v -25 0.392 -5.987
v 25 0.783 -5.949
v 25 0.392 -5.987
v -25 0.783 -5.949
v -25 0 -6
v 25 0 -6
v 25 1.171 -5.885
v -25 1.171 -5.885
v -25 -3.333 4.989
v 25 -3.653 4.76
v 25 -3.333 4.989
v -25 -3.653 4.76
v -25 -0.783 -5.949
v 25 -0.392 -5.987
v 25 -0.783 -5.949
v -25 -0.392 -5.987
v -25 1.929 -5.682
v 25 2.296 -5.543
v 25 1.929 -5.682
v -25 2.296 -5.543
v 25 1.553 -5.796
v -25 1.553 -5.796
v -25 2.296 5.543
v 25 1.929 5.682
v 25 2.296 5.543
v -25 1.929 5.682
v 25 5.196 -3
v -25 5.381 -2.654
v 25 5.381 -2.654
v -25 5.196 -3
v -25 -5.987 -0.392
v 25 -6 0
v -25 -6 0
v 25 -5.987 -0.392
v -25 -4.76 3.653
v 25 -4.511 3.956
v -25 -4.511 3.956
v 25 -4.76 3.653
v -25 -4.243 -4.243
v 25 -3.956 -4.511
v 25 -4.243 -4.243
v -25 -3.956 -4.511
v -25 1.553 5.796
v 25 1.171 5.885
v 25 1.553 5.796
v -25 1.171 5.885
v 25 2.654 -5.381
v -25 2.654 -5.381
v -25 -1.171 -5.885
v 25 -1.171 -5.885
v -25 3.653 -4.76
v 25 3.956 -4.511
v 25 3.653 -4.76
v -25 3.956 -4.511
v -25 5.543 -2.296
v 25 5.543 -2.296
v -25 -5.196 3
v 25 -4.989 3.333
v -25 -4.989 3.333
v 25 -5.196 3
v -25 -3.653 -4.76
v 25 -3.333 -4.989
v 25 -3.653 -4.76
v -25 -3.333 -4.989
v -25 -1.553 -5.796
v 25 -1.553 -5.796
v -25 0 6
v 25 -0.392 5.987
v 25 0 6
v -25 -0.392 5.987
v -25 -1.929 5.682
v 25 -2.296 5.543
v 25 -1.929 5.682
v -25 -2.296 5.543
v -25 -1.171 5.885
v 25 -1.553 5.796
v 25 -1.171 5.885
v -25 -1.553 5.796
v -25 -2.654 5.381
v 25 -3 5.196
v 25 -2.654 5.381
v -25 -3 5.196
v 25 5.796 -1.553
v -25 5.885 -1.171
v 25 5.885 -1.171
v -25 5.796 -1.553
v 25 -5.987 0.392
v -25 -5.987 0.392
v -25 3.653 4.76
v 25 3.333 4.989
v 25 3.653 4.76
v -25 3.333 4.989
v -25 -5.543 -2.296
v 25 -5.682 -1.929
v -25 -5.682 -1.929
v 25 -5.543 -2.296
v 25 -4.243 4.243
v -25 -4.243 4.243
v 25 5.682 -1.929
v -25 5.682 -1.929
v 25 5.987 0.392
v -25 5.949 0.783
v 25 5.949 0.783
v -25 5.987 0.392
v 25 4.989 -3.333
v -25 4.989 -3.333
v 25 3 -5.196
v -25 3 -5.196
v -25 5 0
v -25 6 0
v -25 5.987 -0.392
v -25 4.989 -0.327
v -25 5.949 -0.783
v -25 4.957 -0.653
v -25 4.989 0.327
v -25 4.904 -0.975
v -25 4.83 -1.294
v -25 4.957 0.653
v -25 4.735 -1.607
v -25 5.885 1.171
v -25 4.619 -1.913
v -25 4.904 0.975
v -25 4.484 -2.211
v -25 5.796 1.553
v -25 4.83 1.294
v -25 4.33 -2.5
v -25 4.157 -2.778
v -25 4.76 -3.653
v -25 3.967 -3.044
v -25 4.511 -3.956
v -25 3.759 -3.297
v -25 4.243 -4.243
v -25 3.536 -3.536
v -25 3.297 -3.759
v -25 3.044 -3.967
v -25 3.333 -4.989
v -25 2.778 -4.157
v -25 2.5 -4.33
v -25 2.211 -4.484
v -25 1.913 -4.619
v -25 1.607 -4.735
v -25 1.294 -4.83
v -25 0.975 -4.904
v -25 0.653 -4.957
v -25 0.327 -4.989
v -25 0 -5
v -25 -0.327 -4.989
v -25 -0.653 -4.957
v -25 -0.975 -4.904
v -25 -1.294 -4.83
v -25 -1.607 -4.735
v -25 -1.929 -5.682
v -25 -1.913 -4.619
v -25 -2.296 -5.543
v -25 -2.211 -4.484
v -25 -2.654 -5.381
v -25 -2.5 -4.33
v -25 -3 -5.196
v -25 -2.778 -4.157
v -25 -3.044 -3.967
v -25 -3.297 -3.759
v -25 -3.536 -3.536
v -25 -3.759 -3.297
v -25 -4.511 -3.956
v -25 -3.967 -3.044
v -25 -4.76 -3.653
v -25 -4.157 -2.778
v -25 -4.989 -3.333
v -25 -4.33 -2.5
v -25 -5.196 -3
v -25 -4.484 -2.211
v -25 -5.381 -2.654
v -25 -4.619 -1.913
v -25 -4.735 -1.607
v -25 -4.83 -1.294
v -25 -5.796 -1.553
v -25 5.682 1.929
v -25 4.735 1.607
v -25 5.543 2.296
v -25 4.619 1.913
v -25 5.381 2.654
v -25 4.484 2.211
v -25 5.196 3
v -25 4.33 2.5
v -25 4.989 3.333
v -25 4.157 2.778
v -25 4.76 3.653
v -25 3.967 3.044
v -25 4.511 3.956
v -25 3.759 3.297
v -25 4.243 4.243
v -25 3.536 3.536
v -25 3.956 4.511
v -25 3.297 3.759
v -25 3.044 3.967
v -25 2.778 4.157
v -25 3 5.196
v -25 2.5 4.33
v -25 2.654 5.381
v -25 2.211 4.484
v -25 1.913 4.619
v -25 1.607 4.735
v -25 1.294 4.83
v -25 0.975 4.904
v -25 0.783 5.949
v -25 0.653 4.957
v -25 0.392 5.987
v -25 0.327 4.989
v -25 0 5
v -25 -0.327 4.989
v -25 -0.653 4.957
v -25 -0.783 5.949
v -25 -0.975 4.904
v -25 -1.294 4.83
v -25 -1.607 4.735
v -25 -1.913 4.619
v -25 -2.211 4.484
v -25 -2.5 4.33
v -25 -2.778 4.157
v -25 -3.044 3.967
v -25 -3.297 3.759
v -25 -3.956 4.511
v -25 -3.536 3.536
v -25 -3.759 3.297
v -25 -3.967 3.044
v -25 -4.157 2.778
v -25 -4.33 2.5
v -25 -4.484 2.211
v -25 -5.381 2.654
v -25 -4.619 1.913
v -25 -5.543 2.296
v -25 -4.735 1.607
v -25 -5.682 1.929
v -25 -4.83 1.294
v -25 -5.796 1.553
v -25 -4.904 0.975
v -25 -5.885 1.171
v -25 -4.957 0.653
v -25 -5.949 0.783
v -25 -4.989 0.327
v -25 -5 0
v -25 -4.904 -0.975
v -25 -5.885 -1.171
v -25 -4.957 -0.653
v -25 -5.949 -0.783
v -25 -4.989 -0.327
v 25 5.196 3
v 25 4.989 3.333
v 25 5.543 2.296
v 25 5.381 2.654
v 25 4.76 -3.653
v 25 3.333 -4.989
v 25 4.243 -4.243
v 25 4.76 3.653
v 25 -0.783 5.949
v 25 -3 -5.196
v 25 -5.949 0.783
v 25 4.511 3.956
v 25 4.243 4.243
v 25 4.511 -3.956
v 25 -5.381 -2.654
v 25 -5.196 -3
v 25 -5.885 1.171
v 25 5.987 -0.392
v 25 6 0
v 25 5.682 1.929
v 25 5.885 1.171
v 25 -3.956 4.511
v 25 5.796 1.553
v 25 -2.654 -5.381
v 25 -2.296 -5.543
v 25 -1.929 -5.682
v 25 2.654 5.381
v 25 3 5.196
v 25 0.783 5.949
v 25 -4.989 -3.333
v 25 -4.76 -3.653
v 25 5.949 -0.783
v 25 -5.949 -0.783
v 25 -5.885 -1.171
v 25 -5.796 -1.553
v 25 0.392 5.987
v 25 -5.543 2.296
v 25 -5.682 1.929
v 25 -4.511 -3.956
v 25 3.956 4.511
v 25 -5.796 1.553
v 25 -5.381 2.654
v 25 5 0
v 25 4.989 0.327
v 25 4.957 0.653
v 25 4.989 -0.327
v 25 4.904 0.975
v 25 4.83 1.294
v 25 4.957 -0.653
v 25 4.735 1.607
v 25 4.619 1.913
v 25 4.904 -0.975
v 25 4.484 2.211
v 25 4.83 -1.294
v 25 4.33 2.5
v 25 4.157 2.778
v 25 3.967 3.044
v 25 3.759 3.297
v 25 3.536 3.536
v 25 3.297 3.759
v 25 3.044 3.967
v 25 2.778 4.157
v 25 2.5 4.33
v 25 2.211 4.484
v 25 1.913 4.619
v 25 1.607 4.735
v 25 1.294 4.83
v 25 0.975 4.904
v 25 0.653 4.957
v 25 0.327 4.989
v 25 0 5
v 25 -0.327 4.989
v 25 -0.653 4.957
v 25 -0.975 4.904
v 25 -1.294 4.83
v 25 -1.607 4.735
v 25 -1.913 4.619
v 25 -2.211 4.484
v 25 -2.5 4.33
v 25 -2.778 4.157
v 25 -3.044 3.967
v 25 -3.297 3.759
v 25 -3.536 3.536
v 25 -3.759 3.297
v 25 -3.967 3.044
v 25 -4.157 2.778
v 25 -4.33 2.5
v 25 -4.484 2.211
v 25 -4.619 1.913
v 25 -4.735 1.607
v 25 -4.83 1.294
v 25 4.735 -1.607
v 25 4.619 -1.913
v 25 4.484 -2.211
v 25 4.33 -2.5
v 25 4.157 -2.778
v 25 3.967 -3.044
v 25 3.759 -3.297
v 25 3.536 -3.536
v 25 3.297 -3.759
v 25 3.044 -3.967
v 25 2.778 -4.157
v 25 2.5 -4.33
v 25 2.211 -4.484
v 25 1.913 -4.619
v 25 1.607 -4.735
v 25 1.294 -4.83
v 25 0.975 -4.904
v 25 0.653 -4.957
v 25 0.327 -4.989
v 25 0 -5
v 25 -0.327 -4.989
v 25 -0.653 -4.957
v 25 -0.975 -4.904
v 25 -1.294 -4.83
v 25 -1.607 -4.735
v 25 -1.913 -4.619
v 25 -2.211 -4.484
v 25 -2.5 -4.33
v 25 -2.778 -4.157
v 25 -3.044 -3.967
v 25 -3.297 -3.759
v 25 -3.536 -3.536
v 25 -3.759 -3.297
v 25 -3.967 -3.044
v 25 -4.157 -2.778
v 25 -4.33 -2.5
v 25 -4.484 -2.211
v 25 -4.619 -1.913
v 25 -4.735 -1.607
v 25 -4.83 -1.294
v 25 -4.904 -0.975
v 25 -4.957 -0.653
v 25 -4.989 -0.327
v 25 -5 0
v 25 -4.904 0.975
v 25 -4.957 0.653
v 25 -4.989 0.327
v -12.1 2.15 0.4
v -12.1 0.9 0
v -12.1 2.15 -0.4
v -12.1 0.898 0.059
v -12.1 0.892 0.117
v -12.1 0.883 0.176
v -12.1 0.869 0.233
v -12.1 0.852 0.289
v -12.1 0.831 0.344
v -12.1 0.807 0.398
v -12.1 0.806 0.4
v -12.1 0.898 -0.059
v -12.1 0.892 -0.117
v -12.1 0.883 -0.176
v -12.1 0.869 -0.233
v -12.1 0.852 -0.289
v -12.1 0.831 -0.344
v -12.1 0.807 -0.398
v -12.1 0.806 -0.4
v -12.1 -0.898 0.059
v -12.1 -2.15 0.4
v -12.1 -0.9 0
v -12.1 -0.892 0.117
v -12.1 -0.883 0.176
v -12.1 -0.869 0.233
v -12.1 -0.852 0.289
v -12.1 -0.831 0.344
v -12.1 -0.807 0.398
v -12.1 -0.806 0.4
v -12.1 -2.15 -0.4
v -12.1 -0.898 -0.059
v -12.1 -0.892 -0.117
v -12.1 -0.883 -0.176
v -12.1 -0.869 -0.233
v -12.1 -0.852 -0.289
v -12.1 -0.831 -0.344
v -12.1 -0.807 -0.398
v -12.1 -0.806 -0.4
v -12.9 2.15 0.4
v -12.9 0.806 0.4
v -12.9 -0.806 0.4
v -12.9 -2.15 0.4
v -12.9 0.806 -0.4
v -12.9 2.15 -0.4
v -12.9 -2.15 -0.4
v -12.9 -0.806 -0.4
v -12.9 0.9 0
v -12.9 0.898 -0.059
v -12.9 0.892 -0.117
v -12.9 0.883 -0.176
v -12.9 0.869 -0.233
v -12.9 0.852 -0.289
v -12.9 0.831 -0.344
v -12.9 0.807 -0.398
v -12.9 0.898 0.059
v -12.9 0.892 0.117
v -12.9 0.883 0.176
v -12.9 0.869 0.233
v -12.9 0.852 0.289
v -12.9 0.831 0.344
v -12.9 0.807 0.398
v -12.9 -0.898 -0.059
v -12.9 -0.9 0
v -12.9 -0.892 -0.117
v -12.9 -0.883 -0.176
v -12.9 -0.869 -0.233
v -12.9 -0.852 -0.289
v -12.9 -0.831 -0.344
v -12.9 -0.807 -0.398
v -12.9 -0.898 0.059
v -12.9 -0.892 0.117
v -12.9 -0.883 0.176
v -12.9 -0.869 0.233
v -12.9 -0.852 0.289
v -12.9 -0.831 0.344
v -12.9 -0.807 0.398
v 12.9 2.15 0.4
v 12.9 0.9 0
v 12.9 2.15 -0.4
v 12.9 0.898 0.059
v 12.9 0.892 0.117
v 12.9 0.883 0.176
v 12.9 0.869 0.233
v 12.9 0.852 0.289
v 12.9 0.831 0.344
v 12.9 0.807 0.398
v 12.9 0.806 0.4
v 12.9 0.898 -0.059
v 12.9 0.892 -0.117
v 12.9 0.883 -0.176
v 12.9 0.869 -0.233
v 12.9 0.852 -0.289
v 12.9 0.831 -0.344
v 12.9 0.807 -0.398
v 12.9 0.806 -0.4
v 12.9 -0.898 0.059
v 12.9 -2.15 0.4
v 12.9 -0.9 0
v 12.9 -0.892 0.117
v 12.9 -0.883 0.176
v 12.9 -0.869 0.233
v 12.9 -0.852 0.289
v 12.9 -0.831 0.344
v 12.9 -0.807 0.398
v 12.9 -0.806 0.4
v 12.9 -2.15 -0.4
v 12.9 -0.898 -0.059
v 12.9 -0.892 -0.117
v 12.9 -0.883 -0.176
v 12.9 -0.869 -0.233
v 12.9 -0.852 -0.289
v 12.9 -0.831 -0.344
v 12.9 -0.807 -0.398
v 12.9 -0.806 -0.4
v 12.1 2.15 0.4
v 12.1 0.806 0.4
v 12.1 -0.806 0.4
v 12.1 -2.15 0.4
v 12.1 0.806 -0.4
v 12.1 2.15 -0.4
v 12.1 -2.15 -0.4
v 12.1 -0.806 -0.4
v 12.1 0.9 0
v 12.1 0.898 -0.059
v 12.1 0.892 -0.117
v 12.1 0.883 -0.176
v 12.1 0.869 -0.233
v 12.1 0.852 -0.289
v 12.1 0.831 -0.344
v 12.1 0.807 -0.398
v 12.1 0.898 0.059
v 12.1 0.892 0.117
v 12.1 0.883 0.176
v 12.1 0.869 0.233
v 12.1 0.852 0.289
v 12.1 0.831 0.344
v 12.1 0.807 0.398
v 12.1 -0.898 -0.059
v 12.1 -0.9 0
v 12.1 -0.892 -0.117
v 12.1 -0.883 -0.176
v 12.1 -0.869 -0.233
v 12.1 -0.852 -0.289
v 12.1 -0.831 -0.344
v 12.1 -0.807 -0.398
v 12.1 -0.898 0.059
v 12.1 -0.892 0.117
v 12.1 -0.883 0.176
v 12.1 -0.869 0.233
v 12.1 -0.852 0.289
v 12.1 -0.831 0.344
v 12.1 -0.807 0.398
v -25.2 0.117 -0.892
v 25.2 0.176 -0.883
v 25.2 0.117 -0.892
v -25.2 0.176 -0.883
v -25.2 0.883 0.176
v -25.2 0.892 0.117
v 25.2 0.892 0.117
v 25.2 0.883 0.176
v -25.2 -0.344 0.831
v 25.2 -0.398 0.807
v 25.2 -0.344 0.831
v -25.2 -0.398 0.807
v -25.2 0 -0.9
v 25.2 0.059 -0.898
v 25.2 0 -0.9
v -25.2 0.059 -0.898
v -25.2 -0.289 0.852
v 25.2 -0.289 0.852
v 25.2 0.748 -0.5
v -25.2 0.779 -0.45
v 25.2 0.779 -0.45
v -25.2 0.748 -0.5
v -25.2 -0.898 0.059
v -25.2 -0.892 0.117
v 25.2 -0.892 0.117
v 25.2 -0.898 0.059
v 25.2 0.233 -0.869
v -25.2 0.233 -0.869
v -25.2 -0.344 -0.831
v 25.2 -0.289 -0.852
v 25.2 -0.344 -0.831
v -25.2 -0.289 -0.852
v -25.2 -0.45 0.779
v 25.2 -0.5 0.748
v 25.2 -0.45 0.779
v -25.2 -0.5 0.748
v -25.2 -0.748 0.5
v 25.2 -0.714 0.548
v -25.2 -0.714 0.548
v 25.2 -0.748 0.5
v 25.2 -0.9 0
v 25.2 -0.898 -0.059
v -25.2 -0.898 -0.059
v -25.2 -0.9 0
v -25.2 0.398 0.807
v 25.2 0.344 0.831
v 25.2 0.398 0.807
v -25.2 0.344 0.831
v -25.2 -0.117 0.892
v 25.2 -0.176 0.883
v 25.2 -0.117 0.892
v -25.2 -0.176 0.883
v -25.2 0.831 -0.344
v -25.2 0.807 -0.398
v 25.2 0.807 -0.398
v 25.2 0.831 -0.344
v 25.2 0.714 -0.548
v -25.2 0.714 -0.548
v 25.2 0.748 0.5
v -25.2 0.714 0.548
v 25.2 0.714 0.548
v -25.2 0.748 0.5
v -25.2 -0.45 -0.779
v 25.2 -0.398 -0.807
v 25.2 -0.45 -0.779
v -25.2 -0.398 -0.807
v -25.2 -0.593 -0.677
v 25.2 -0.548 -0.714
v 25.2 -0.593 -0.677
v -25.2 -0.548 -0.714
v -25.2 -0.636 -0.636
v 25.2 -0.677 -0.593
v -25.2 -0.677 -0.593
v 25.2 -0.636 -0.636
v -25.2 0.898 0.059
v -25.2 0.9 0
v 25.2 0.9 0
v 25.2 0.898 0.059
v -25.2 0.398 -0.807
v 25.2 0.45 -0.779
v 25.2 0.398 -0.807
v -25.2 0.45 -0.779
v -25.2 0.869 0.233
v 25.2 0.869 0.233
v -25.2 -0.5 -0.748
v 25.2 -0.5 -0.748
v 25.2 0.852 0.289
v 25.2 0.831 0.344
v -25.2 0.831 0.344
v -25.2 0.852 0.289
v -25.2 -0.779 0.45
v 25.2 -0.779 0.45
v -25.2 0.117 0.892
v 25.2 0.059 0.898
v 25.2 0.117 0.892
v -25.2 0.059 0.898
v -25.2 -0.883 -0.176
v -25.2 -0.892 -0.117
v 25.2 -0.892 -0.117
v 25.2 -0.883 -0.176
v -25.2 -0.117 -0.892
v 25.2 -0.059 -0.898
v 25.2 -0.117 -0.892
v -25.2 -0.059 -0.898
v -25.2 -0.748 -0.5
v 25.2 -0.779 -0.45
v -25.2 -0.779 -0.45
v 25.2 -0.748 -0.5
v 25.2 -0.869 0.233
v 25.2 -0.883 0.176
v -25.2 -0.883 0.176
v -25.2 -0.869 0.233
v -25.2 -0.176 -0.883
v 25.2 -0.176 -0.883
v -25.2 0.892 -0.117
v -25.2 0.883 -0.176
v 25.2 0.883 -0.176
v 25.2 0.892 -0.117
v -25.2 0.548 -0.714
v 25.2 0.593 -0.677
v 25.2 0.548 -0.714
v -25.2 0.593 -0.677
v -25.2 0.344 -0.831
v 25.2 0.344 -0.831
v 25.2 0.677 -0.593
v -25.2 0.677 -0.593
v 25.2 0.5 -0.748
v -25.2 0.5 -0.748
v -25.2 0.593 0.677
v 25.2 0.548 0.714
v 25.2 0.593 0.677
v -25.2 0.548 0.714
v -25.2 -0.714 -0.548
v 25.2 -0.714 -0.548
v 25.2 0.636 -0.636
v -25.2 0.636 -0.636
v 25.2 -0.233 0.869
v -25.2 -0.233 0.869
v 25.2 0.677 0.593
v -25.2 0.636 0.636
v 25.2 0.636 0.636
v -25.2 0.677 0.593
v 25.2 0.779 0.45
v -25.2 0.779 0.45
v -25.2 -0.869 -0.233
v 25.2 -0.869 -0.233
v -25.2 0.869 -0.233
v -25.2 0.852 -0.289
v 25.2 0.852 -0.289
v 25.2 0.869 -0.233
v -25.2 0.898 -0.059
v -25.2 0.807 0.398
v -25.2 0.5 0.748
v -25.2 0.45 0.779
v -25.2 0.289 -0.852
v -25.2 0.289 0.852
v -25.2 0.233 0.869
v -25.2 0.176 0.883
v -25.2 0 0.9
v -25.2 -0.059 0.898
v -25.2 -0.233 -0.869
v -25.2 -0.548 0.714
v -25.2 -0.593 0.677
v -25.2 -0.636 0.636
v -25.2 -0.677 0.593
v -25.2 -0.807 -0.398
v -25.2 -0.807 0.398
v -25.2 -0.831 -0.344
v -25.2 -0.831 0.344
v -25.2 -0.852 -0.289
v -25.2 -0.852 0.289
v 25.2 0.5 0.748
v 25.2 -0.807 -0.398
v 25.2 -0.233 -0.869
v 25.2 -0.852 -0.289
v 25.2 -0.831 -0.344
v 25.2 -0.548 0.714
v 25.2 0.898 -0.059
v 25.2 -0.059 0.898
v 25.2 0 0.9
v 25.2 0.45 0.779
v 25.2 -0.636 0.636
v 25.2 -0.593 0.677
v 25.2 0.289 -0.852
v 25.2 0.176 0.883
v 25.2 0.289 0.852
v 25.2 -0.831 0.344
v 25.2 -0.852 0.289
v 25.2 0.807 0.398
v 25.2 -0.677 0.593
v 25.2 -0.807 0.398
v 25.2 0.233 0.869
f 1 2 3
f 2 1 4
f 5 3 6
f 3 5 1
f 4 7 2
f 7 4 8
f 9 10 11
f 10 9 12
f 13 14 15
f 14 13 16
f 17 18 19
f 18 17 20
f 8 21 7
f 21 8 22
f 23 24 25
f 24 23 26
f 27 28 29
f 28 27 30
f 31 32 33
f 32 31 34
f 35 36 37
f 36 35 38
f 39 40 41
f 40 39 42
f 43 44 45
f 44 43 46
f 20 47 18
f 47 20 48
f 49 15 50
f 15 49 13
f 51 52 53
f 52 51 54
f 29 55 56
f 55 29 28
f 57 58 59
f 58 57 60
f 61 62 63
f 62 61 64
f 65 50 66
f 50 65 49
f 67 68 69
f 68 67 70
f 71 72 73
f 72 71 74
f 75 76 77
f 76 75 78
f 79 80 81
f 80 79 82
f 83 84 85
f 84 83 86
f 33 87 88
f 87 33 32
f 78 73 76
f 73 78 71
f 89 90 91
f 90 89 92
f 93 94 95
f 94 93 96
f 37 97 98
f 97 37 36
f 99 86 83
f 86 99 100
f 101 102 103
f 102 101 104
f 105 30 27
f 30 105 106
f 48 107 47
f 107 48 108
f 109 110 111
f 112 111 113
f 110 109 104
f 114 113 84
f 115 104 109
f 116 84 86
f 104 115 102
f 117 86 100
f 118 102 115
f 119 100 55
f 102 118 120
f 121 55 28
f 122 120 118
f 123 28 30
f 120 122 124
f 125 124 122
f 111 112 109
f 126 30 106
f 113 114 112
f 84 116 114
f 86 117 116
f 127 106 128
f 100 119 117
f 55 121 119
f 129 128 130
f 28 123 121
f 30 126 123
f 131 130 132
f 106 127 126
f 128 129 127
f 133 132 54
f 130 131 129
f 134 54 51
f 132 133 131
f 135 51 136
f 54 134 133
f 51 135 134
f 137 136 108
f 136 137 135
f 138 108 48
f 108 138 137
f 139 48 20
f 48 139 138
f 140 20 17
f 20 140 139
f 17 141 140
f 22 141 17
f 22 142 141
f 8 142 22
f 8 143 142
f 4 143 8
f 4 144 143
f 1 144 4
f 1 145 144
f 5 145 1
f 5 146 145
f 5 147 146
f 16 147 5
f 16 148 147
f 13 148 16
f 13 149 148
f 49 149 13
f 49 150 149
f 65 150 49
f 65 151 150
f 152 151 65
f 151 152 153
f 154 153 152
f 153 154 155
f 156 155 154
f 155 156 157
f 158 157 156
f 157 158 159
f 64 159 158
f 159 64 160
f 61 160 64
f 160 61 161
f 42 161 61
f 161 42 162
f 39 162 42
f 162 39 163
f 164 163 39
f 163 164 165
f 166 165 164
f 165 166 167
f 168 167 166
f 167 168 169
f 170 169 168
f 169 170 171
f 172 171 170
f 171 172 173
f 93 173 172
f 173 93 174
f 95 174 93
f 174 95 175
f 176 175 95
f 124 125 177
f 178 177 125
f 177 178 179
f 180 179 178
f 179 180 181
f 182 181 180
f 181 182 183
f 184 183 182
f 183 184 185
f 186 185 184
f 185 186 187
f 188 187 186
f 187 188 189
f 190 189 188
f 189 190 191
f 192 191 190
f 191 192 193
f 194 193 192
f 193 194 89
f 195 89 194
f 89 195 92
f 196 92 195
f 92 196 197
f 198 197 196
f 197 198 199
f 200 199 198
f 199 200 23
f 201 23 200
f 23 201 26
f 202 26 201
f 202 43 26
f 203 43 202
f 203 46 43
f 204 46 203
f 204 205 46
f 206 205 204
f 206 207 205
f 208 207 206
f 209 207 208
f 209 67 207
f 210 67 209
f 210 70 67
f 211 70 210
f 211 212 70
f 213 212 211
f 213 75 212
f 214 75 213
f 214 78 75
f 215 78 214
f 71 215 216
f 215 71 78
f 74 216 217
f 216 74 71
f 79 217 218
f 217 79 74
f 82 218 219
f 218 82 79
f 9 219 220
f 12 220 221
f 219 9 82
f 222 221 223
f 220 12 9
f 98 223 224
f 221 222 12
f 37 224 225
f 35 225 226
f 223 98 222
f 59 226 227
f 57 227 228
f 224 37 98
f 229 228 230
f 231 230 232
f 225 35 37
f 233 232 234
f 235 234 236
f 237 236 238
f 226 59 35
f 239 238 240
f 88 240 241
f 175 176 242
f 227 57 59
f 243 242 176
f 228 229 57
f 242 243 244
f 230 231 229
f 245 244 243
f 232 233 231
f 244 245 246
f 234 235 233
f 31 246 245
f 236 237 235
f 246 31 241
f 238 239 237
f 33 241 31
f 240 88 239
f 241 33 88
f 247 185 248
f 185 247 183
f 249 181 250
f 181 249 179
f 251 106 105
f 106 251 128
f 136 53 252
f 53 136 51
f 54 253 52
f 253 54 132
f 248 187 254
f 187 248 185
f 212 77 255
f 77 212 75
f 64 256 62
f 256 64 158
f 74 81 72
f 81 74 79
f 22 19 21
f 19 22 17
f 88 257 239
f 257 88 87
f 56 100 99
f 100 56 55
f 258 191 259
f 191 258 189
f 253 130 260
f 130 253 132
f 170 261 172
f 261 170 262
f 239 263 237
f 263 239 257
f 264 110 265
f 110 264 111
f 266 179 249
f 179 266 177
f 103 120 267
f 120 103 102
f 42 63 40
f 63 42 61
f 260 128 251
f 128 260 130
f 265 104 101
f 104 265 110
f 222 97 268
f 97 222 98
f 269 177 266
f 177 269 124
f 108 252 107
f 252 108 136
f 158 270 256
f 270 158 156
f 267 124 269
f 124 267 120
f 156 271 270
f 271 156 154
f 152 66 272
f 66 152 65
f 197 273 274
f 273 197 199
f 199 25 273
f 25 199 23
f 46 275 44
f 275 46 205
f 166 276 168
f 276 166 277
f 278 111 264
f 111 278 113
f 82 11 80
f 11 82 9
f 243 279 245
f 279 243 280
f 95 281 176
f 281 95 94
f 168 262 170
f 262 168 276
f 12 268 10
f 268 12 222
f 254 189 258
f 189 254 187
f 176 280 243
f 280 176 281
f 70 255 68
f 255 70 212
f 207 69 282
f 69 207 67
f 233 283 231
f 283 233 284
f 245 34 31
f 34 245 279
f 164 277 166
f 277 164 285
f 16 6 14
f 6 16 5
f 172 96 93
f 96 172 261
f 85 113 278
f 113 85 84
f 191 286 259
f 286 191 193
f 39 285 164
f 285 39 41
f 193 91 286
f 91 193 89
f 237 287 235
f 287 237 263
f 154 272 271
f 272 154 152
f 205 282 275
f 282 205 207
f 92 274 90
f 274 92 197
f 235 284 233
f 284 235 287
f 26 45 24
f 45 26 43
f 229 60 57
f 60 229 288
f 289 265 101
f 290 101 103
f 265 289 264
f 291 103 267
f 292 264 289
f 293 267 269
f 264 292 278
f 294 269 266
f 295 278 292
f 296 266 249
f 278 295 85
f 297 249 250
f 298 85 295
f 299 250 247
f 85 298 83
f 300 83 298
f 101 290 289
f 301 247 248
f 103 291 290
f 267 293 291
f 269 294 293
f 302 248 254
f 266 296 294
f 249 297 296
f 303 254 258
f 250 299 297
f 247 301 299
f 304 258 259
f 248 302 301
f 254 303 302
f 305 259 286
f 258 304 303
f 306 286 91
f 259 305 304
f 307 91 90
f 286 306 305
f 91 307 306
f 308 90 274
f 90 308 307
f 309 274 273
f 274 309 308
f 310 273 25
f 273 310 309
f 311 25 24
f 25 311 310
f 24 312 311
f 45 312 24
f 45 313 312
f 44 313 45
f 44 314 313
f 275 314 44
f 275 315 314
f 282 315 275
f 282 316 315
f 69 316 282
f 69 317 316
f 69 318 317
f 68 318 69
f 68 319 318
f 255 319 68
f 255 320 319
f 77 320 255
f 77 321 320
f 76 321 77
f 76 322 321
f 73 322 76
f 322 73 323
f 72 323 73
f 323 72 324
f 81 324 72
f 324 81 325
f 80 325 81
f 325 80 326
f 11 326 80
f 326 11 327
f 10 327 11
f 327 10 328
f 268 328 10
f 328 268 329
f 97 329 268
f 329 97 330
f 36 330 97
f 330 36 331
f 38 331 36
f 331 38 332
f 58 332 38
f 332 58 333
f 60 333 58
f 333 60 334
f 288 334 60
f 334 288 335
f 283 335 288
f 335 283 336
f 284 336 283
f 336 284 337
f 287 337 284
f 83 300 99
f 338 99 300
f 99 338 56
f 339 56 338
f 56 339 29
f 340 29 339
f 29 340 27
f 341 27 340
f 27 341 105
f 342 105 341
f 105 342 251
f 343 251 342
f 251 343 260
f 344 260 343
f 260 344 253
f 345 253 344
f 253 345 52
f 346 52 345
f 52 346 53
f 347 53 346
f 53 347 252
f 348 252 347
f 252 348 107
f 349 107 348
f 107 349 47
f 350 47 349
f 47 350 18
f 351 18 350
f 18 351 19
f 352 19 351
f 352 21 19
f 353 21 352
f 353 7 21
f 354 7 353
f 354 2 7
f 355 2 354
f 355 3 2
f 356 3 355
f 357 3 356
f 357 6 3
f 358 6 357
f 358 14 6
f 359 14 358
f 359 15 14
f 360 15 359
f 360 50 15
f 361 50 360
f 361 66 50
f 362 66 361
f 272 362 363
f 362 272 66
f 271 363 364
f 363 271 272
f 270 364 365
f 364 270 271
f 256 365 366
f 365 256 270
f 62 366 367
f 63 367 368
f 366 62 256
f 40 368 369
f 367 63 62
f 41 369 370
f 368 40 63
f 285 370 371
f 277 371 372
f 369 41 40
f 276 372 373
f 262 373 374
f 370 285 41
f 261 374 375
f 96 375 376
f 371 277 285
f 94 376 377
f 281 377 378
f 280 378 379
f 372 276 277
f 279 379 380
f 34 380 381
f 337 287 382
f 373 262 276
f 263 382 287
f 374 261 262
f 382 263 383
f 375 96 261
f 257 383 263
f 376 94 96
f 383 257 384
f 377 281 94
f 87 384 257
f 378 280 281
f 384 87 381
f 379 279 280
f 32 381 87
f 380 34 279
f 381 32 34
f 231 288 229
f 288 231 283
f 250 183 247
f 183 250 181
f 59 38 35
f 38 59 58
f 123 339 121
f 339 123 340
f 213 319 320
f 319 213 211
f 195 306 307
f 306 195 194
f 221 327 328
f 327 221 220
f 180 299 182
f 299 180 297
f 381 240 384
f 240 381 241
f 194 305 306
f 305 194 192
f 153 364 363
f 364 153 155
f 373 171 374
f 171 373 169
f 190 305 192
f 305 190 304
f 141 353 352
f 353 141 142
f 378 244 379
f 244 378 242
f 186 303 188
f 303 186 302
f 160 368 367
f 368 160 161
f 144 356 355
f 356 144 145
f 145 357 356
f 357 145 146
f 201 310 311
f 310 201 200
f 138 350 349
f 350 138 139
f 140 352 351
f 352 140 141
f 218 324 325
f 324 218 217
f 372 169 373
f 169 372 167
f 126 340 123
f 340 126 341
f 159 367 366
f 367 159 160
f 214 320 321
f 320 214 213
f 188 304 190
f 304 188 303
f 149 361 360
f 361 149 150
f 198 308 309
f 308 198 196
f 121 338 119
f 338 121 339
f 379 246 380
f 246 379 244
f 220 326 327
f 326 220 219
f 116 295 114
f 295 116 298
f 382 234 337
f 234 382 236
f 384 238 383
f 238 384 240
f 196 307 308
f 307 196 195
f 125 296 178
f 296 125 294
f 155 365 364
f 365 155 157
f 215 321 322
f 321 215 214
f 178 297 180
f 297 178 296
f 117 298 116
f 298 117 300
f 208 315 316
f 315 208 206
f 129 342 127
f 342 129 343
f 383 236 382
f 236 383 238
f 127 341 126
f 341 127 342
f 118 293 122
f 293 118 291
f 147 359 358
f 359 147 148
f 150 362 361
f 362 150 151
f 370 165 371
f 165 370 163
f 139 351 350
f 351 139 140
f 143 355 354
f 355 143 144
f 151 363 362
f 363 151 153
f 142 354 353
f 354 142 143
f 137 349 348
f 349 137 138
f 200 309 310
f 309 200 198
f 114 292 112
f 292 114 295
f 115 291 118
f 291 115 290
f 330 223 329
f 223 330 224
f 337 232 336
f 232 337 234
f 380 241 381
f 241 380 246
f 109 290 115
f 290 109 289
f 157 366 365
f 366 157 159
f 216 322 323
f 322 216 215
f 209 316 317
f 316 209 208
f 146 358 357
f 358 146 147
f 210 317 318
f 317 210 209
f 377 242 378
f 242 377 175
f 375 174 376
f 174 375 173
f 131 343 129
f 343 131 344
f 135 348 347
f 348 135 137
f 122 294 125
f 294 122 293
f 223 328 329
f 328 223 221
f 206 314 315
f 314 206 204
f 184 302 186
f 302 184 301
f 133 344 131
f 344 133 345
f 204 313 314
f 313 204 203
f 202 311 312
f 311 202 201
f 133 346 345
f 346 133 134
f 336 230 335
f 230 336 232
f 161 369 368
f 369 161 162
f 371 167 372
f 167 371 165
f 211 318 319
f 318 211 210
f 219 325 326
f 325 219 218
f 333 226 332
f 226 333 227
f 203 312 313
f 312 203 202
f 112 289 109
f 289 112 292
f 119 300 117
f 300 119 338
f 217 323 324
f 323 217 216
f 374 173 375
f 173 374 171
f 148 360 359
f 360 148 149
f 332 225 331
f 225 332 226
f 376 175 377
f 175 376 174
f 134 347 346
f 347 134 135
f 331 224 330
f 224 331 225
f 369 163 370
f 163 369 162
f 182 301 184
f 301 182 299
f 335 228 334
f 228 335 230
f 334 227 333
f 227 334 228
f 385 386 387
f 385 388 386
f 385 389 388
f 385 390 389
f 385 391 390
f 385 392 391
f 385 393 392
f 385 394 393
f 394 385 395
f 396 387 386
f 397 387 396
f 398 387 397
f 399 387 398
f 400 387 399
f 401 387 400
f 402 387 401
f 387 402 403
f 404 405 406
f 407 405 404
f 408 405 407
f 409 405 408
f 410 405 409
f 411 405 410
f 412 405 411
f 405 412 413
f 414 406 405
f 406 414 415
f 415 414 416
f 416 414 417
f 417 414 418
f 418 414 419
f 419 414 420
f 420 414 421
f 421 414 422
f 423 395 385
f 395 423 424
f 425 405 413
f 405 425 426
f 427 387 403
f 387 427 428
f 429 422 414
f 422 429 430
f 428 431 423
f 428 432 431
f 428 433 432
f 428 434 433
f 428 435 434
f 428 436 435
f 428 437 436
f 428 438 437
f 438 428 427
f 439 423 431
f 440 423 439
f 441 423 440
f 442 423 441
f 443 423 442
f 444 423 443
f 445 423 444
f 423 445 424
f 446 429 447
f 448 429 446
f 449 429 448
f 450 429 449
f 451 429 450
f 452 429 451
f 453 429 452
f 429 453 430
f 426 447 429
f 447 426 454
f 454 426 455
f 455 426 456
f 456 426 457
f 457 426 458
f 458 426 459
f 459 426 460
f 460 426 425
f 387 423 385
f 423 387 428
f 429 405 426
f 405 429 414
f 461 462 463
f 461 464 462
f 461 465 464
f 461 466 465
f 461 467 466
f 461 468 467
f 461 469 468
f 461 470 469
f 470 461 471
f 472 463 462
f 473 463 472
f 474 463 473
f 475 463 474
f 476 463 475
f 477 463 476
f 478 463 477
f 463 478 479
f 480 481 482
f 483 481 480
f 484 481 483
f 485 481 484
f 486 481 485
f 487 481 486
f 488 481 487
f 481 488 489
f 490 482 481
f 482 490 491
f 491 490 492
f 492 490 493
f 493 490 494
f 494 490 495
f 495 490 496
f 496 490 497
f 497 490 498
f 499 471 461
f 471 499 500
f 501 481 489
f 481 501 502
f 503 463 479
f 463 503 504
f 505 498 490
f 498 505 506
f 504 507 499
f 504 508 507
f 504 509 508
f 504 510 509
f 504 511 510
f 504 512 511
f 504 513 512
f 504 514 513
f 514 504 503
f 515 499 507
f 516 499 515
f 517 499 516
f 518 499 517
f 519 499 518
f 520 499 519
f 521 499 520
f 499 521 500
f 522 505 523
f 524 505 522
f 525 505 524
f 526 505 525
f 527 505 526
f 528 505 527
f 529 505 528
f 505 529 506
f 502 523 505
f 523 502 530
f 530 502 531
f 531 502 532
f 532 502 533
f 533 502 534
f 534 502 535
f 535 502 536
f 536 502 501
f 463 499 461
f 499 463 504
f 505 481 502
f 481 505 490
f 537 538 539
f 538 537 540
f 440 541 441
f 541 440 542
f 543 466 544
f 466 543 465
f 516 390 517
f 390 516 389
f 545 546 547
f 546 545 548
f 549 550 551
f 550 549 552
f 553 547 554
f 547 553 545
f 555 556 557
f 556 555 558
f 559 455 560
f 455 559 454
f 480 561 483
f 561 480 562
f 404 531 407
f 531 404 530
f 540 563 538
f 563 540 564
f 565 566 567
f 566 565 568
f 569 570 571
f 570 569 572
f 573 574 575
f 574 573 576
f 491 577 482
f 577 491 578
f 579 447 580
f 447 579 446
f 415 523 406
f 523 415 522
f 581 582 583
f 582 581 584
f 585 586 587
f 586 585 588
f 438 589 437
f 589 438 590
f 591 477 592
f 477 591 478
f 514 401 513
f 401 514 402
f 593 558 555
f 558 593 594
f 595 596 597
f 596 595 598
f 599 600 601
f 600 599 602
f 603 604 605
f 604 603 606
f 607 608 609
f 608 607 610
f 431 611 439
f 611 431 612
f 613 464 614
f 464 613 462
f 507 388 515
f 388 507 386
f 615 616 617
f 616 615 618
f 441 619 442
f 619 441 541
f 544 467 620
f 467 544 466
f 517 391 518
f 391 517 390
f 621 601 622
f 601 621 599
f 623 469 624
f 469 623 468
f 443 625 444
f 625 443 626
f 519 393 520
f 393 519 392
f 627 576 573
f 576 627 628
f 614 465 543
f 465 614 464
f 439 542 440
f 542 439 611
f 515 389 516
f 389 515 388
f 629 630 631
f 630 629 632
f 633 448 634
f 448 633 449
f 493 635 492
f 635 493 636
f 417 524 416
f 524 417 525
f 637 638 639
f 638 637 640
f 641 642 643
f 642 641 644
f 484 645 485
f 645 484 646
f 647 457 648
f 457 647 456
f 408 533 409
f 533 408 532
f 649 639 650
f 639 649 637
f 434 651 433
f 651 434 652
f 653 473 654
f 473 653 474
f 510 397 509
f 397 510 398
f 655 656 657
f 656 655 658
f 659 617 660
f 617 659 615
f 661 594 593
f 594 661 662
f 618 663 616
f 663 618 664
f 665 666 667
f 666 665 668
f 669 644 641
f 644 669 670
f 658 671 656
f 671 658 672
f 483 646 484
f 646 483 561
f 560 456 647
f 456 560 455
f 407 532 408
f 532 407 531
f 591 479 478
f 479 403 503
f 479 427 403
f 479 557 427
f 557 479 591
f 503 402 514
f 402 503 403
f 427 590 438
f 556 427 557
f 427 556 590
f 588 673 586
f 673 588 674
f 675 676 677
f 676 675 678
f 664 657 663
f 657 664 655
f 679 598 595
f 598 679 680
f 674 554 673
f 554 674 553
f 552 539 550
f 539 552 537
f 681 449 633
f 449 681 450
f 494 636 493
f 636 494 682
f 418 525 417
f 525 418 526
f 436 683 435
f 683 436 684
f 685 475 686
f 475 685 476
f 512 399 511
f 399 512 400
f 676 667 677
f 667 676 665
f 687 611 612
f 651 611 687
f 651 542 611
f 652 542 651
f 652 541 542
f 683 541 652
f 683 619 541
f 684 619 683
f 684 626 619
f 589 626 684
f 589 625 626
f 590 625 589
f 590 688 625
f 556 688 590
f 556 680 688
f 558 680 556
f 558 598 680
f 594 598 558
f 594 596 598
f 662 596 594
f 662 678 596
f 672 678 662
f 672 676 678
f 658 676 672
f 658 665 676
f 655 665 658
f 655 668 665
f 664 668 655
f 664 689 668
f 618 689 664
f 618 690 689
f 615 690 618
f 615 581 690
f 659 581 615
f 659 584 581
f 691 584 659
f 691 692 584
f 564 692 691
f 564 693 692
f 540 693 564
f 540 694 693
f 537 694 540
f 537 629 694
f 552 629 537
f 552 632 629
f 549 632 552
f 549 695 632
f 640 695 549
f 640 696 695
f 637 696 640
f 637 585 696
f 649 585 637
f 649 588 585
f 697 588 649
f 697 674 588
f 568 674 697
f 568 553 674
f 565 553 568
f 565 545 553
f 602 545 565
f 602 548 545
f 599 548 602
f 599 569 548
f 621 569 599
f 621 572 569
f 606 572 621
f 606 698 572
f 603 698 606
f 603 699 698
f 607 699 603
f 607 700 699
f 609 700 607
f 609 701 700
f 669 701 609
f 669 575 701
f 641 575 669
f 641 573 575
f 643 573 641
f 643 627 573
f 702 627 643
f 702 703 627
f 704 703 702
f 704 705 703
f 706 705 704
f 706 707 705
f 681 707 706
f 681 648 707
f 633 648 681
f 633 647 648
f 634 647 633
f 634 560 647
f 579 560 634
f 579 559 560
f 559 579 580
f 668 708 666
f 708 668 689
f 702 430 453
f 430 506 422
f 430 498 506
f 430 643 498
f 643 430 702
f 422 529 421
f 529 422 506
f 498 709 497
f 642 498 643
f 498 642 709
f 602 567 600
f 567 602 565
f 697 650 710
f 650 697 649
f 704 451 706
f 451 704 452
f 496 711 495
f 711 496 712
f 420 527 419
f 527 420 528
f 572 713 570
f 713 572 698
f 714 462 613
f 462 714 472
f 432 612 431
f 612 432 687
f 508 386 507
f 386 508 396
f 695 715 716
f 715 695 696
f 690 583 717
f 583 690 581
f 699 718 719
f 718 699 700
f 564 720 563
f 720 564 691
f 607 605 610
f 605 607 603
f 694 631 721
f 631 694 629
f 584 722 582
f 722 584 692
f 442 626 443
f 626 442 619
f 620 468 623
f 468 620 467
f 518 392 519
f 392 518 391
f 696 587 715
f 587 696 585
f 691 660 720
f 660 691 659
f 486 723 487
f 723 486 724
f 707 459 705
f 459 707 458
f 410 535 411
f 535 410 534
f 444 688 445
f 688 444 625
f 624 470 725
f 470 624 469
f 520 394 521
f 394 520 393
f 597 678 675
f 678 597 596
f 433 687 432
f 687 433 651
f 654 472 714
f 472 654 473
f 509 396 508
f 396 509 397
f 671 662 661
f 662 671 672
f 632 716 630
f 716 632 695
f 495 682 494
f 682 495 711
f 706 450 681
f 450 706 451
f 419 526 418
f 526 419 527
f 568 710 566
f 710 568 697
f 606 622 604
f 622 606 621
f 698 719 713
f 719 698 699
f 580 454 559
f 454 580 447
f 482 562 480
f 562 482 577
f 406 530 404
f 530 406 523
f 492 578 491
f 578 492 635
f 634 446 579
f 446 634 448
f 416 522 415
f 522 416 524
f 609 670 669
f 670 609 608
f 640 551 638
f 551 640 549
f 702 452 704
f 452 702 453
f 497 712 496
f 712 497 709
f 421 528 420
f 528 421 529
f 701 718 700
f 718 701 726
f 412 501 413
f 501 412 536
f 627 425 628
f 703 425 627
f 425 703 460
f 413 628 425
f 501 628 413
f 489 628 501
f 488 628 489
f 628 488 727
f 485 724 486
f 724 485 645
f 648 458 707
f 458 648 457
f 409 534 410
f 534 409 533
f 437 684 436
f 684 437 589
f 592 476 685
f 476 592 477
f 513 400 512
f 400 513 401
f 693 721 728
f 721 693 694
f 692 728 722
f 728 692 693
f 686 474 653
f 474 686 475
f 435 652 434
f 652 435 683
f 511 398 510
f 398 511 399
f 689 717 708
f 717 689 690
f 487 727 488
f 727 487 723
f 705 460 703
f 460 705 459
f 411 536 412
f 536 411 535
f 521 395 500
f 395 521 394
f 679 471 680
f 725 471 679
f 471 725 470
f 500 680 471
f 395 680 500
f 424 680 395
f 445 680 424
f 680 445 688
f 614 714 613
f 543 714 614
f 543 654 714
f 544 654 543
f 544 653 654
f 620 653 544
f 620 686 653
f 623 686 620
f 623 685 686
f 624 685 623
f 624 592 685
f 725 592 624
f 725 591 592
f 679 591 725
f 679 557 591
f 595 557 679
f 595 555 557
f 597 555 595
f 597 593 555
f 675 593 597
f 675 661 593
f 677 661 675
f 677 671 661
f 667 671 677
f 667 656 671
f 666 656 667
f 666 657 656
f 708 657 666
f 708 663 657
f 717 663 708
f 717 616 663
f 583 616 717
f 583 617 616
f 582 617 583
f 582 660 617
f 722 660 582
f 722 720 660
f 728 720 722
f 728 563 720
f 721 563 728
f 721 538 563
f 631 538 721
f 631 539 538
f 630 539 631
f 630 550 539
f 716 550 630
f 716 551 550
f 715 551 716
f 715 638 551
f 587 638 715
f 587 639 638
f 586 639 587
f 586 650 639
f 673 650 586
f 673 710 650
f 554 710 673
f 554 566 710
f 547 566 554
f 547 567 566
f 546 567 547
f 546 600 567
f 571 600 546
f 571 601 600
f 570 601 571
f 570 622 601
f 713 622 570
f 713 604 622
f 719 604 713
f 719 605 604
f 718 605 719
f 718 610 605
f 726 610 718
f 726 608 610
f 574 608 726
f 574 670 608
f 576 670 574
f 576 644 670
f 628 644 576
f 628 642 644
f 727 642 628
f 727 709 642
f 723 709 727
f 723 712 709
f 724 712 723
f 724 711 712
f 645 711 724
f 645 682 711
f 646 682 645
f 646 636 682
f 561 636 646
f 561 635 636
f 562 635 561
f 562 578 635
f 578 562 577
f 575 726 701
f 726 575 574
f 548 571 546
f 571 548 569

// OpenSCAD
$fn = 96;

// Parameters for the heatshrink sleeving (tube)
inner_diameter = 10;   // ID
wall_thickness = 1;    // wall
length = 50;           // tube length

// Small overlaps to ensure clean boolean results and one connected solid
eps = 0.2;

// Heatshrink sleeving as a hollow tube, oriented along X so side views show length
module heatshrink_sleeve(id, wall, len) {
    od = id + 2*wall;
    rotate([0, 90, 0])  // axis along X
    difference() {
        cylinder(h = len, d = od, center = true);
        cylinder(h = len + 2*eps, d = id, center = true); // extend to guarantee open ends
    }
}

// Optional internal core (e.g., wire/resistor lead) to make a single connected solid
// Kept thin so the tube still reads as hollow in orthographic views.
module inner_core(id, len) {
    core_d = max(0.8, id * 0.18);
    rotate([0, 90, 0])
        cylinder(h = len + 2*eps, d = core_d, center = true);
}

// Assemble as ONE connected solid (core touches inner wall via tiny bridge ribs)
module tubing() {
    id = inner_diameter;
    wall = wall_thickness;
    len = length;

    union() {
        heatshrink_sleeve(id, wall, len);

        // Core
        inner_core(id, len);

        // Two tiny ribs to connect core to sleeve (ensures single connected solid)
        // Positioned at +/- len/4 along tube, spanning from core to inner wall.
        rib_len = id/2 - max(0.8, id*0.18)/2 + eps;
        rib_w   = max(0.6, wall*0.8);
        rib_h   = max(0.6, wall*0.8);

        for (sx = [-1, 1]) {
            translate([sx * len/4, 0, 0])
                cube([rib_w, rib_len, rib_h], center = true);
        }
    }
}

tubing();
